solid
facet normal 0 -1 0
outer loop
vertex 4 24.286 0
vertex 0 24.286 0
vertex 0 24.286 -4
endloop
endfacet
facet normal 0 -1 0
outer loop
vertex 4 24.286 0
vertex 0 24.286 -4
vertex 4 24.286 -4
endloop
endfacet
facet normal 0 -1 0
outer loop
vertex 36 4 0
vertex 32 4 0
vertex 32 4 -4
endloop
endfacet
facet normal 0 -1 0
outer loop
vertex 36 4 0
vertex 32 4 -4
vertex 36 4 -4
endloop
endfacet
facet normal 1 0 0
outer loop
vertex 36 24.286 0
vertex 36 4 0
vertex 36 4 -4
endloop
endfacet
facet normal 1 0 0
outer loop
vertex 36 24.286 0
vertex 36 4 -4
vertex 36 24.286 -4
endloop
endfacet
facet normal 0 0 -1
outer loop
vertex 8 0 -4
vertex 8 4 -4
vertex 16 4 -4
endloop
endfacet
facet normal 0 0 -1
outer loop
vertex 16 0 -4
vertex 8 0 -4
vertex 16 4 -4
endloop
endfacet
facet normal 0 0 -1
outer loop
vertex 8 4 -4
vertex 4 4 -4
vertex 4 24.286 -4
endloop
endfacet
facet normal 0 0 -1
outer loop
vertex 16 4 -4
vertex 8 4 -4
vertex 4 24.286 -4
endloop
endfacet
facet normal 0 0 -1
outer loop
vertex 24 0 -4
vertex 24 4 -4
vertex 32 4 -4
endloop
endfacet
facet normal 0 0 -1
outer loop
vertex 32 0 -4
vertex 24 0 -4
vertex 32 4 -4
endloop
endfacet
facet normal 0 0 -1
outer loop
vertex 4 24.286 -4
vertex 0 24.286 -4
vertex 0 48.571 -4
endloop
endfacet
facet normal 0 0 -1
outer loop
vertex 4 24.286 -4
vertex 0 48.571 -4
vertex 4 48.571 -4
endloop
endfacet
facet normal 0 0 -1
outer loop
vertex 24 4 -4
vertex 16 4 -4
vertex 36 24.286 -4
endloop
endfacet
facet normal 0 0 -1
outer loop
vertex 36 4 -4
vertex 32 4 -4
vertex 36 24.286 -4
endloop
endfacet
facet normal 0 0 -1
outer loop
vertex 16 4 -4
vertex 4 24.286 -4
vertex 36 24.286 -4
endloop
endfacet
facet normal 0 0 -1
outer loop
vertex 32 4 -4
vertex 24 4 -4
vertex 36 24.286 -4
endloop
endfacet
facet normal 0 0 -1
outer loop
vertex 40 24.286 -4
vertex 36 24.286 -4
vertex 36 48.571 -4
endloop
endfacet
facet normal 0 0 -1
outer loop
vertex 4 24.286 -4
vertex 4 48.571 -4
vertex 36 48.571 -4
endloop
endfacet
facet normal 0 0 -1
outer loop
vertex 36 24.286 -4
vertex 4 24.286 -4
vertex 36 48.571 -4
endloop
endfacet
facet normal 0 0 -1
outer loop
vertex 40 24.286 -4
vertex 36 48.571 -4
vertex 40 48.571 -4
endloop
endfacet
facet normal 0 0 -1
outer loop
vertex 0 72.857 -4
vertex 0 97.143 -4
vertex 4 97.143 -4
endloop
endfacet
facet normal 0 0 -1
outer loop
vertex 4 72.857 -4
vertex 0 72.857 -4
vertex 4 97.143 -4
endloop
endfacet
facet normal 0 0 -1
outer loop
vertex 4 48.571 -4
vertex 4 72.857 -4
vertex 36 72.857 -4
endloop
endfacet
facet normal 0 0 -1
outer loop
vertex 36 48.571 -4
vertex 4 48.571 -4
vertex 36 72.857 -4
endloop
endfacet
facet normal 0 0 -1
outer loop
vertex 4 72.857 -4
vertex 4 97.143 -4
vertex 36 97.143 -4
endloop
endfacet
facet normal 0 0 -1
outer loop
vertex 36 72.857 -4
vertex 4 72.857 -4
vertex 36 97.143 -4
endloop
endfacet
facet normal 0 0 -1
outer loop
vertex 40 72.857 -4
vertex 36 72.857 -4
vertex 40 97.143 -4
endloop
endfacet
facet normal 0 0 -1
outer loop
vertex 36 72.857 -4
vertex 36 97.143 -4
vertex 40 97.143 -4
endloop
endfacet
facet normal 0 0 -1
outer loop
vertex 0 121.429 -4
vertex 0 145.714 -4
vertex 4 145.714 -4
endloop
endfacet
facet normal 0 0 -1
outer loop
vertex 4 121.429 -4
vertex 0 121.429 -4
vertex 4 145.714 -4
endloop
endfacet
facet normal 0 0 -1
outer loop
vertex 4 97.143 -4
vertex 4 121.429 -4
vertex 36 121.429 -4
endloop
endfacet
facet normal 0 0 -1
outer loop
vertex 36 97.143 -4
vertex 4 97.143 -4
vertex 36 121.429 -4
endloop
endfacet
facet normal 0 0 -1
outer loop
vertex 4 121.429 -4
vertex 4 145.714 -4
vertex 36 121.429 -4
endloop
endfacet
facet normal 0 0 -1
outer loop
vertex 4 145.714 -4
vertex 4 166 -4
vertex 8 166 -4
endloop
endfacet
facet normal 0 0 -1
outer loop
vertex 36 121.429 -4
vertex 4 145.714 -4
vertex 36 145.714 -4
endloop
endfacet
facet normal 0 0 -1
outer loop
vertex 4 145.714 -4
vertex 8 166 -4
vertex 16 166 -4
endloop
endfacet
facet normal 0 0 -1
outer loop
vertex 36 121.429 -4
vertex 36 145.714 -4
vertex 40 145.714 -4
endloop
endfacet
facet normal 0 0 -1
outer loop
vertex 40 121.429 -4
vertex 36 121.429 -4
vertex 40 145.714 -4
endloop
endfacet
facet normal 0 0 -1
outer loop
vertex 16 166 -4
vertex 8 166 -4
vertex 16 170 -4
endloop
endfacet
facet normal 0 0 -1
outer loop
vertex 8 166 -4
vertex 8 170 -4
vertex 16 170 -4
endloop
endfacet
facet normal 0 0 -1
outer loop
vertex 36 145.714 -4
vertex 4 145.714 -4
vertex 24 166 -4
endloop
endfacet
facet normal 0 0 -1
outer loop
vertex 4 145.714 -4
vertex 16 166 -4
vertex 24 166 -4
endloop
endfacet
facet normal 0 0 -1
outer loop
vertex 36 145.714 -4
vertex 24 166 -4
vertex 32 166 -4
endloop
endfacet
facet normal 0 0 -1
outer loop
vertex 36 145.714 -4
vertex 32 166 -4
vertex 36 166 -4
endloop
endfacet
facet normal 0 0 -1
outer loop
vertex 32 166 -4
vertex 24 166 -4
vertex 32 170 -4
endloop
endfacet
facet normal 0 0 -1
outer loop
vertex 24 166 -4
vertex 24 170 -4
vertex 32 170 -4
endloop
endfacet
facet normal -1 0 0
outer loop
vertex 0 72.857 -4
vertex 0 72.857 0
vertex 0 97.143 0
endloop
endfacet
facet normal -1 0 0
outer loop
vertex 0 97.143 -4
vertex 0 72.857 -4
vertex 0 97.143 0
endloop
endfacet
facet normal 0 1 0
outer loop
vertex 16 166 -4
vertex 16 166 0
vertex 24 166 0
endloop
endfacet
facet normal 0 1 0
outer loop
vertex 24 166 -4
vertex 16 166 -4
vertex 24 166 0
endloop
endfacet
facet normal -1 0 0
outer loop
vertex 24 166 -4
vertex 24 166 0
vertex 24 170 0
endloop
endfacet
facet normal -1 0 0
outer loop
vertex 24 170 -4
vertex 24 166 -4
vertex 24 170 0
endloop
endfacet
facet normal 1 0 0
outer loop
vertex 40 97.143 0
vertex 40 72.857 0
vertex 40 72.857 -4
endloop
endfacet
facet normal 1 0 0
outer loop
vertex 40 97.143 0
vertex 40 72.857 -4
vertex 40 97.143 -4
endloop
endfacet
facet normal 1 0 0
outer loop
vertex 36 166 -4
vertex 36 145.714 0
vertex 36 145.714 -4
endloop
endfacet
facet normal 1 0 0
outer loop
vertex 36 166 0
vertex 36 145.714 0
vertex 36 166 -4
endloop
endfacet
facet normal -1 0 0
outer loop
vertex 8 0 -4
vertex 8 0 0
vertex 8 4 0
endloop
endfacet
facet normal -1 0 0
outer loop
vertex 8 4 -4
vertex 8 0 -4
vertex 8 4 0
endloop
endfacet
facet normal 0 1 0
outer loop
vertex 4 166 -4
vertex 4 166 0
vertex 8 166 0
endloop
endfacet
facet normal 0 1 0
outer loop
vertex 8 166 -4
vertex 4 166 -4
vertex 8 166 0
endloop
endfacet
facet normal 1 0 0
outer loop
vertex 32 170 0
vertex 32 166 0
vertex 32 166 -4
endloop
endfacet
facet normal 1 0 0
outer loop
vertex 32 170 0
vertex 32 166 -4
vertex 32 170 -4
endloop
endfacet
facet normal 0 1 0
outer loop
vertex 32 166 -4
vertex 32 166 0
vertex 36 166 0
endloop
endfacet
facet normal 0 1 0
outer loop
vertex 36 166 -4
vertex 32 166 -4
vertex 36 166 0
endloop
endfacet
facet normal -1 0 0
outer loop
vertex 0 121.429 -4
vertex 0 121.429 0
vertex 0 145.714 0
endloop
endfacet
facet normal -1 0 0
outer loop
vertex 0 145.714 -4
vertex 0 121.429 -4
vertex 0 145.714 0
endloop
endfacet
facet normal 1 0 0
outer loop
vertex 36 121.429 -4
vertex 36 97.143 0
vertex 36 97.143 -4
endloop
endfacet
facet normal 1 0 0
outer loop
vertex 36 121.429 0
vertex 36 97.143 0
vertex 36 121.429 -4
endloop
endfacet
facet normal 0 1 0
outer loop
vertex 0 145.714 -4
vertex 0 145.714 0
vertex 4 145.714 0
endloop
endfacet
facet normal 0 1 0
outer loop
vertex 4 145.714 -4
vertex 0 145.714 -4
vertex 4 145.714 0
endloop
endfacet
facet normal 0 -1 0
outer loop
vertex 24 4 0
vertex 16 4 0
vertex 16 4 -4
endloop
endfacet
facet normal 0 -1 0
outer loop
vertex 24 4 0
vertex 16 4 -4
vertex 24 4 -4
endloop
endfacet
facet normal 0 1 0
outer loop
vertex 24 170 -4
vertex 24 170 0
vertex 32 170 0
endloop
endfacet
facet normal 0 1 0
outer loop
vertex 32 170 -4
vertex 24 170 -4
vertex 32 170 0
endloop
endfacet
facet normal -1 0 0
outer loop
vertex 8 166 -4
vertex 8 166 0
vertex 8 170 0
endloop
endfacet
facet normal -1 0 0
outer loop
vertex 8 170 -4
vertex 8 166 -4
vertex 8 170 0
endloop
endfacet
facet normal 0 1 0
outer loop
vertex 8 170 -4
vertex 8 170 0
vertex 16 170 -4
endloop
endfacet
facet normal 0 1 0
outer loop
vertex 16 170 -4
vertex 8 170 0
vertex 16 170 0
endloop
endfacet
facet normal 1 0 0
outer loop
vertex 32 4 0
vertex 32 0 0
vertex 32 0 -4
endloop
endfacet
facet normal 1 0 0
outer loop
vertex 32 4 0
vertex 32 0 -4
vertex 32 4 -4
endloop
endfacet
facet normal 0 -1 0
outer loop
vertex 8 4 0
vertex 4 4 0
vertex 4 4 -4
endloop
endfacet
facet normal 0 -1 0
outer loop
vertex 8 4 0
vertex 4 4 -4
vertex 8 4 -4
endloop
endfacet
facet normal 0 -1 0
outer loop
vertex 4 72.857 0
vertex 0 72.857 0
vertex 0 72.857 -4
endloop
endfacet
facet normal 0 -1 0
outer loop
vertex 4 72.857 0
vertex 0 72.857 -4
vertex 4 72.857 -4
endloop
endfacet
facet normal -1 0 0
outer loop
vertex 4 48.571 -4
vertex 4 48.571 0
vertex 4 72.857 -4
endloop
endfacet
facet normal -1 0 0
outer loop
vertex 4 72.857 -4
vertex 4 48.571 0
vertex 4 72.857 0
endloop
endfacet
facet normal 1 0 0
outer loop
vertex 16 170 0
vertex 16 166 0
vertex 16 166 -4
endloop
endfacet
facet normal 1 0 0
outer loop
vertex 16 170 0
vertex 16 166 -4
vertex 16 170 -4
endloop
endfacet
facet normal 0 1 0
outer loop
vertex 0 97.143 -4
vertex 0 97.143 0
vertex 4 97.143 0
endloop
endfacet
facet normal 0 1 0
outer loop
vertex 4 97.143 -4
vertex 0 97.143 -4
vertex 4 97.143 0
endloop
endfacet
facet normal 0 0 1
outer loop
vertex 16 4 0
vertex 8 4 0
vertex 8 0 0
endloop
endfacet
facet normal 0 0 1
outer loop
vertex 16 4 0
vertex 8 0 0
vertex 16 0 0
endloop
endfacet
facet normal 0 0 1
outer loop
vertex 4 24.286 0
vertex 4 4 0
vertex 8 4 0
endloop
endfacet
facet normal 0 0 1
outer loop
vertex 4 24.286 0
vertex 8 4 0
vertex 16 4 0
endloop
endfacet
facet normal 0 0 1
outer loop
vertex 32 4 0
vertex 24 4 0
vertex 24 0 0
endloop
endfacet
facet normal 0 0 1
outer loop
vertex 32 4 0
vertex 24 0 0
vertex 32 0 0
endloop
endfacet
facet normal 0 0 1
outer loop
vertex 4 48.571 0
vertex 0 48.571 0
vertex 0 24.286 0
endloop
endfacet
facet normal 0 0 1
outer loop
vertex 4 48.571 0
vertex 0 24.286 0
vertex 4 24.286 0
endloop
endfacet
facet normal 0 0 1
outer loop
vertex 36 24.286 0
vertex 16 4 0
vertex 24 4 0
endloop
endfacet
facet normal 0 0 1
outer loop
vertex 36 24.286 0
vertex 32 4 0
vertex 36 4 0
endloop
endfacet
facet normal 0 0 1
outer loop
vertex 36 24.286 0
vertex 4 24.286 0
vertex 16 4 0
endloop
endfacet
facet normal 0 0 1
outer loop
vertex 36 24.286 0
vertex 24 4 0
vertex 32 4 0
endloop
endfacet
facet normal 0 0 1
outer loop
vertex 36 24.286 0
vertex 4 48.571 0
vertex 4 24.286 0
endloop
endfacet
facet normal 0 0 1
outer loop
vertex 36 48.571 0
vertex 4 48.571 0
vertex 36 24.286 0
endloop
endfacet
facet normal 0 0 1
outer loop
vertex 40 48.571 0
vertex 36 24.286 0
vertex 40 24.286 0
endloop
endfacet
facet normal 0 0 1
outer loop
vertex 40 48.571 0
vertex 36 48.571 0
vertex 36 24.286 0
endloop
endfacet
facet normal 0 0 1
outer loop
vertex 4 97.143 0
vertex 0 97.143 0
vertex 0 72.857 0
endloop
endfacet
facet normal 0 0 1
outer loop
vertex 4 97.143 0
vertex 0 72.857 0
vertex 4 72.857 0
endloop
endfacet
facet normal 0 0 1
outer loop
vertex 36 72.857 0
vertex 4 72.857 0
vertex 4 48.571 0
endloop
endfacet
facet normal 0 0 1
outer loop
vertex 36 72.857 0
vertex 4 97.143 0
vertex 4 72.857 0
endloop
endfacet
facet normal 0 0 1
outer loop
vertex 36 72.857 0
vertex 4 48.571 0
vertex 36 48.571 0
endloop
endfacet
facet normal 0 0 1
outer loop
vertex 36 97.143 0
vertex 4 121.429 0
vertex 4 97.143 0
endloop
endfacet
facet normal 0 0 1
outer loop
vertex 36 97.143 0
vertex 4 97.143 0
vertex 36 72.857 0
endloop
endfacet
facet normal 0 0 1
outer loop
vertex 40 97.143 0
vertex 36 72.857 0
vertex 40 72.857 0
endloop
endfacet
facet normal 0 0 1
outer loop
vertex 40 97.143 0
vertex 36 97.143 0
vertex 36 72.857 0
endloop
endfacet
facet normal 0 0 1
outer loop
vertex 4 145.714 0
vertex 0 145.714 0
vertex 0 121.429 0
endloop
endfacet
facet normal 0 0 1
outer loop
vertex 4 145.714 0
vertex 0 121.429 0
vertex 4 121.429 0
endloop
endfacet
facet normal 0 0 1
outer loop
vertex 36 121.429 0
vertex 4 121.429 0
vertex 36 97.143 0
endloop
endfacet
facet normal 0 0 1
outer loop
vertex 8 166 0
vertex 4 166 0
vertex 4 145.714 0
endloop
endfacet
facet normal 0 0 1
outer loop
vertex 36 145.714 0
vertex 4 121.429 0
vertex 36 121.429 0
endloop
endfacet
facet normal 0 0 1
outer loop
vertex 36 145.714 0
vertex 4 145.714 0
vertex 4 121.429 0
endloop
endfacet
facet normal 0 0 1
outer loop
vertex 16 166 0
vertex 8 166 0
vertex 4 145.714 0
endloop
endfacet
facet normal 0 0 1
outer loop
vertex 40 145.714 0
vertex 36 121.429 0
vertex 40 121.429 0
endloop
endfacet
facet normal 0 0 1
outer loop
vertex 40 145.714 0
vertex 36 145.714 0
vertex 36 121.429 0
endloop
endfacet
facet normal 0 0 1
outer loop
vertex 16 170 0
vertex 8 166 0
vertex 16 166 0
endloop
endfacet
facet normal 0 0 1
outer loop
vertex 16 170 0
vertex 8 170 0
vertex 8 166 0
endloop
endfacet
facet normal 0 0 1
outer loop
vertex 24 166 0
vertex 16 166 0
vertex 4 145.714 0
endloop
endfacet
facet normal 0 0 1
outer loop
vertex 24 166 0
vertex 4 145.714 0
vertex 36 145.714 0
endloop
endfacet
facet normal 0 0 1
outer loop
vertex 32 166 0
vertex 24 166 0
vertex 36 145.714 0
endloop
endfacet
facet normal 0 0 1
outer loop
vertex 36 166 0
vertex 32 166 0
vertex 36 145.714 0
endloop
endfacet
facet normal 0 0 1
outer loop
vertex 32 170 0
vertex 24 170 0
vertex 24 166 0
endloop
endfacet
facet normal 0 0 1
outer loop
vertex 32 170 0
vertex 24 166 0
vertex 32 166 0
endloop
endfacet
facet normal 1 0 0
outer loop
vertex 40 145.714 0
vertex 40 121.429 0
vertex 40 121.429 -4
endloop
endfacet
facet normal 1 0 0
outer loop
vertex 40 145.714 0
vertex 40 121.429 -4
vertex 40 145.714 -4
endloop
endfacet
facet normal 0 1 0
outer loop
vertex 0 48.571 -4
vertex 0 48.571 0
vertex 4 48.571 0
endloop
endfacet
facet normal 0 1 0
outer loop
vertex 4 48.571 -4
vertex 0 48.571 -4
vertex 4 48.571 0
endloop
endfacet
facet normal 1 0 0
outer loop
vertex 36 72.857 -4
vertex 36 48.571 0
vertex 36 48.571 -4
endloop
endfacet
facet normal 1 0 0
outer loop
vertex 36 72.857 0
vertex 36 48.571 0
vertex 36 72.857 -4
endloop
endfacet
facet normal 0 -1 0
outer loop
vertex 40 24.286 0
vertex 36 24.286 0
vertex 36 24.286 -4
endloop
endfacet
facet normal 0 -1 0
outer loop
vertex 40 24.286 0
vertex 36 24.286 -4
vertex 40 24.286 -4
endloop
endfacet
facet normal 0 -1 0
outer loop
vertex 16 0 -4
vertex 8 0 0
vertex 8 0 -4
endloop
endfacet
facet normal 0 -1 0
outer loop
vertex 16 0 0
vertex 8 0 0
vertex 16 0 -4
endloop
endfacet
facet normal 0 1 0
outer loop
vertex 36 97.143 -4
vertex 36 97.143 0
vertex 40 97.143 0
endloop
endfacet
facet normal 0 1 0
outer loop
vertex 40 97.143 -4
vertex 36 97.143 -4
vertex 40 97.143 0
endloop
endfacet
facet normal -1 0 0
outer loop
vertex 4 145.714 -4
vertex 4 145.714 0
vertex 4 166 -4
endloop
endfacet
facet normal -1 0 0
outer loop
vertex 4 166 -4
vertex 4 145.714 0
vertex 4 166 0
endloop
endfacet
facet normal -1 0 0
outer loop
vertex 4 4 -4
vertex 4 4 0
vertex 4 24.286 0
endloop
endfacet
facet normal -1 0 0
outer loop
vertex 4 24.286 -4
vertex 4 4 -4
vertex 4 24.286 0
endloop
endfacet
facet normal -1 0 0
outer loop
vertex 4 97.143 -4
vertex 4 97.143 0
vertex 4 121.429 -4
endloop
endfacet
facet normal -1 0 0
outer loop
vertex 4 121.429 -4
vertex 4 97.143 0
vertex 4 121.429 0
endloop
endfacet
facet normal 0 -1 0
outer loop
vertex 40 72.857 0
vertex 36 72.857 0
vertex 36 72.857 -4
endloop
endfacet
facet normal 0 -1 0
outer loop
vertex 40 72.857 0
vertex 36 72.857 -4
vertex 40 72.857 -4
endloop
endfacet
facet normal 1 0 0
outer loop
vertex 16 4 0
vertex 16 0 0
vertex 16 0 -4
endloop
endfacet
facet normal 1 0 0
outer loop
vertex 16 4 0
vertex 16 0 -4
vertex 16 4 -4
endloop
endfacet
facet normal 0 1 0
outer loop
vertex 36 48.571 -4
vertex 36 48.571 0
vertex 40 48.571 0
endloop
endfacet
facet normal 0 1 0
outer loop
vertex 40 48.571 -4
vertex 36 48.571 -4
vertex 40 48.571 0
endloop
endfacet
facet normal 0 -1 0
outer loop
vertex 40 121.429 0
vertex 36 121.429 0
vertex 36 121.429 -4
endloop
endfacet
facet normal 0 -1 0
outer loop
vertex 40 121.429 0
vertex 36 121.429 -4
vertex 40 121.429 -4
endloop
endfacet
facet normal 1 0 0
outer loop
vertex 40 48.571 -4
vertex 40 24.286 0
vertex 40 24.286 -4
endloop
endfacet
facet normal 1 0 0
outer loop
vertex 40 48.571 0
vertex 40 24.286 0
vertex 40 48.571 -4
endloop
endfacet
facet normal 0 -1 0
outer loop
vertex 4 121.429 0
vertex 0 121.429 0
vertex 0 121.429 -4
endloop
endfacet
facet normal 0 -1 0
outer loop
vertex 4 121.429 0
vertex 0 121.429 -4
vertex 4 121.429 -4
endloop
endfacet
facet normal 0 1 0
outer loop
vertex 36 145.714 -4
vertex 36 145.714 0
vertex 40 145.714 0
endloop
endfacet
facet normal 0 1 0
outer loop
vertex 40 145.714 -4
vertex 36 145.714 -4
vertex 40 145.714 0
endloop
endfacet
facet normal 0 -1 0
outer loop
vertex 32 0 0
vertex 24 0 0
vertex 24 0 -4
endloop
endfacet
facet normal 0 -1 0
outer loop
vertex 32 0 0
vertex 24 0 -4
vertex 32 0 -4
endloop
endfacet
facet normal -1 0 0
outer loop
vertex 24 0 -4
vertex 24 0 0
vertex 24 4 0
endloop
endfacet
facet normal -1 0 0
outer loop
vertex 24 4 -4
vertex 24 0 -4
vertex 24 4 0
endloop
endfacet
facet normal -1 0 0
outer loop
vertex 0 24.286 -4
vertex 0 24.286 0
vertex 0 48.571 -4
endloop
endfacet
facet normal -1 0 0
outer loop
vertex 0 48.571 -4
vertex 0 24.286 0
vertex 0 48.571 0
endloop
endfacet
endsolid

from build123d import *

# Parameters (mm, degrees)
BUITENAFMETING_RECHTHOEK_W  = 40
BUITENAFMETING_RECHTHOEK_H  = 170
PLAAT_DEPTH                 = 4
TAND_HOR_W                  = 8
TAND_HOR_H                  = 4
TAND_BOVEN_DEPTH            = 5
TANDEN_PATROON_BOVEN_COUNT  = 3
TANDEN_PATROON_BOVEN_PITCH  = 16
TAND_VER_W                  = 4
TAND_VER_H                  = 24.285714286
TAND_LINKS_DEPTH            = 5
TANDEN_PATROON_LINKS_COUNT  = 4
TANDEN_PATROON_LINKS_PITCH  = 48.571428571
TAND_O_W                    = 8
TAND_O_H                    = 4
TAND_ONDER_DEPTH            = 5
TANDEN_PATROON_ONDER_COUNT  = 3
TANDEN_PATROON_ONDER_PITCH  = 16
TAND_R_W                    = 4
TAND_R_H                    = 24.285714286
TAND_RECHTS_DEPTH           = 5
TANDEN_PATROON_RECHTS_COUNT = 4
TANDEN_PATROON_RECHTS_PITCH = 48.571428571


with BuildPart() as part:
    # Buitenafmeting Rechthoek → Plaat (new body)
    with BuildSketch(Plane.XY):
        with Locations((20, 85)):
            Rectangle(BUITENAFMETING_RECHTHOEK_W, BUITENAFMETING_RECHTHOEK_H)
    extrude(amount=-PLAAT_DEPTH)

    # Tand Hor → Tand Boven (cut, through all)
    with BuildSketch(Plane.XY):
        with Locations((4, 168)):
            Rectangle(TAND_HOR_W, TAND_HOR_H)
    tand_boven = extrude(amount=-TAND_BOVEN_DEPTH, mode=Mode.SUBTRACT)

    # Tanden Patroon Boven: Tand Boven ×3
    with Locations(*[(i * TANDEN_PATROON_BOVEN_PITCH, 0, 0) for i in range(1, TANDEN_PATROON_BOVEN_COUNT)]):
        add(tand_boven, mode=Mode.SUBTRACT)

    # Tand Ver → Tand Links (cut, through all)
    with BuildSketch(Plane.XY):
        with Locations((2, 157.857142857)):
            Rectangle(TAND_VER_W, TAND_VER_H)
    tand_links = extrude(amount=-TAND_LINKS_DEPTH, mode=Mode.SUBTRACT)

    # Tanden Patroon Links: Tand Links ×4
    with Locations(*[(0, -i * TANDEN_PATROON_LINKS_PITCH, 0) for i in range(1, TANDEN_PATROON_LINKS_COUNT)]):
        add(tand_links, mode=Mode.SUBTRACT)

    # Tand O → Tand Onder (cut, through all)
    with BuildSketch(Plane.XY):
        with Locations((4, 2)):
            Rectangle(TAND_O_W, TAND_O_H)
    tand_onder = extrude(amount=-TAND_ONDER_DEPTH, mode=Mode.SUBTRACT)

    # Tanden Patroon Onder: Tand Onder ×3
    with Locations(*[(i * TANDEN_PATROON_ONDER_PITCH, 0, 0) for i in range(1, TANDEN_PATROON_ONDER_COUNT)]):
        add(tand_onder, mode=Mode.SUBTRACT)

    # Tand R → Tand Rechts (cut, through all)
    with BuildSketch(Plane.XY):
        with Locations((38, 157.857142857)):
            Rectangle(TAND_R_W, TAND_R_H)
    tand_rechts = extrude(amount=-TAND_RECHTS_DEPTH, mode=Mode.SUBTRACT)

    # Tanden Patroon Rechts: Tand Rechts ×4
    with Locations(*[(0, -i * TANDEN_PATROON_RECHTS_PITCH, 0) for i in range(1, TANDEN_PATROON_RECHTS_COUNT)]):
        add(tand_rechts, mode=Mode.SUBTRACT)


solid = part.part
